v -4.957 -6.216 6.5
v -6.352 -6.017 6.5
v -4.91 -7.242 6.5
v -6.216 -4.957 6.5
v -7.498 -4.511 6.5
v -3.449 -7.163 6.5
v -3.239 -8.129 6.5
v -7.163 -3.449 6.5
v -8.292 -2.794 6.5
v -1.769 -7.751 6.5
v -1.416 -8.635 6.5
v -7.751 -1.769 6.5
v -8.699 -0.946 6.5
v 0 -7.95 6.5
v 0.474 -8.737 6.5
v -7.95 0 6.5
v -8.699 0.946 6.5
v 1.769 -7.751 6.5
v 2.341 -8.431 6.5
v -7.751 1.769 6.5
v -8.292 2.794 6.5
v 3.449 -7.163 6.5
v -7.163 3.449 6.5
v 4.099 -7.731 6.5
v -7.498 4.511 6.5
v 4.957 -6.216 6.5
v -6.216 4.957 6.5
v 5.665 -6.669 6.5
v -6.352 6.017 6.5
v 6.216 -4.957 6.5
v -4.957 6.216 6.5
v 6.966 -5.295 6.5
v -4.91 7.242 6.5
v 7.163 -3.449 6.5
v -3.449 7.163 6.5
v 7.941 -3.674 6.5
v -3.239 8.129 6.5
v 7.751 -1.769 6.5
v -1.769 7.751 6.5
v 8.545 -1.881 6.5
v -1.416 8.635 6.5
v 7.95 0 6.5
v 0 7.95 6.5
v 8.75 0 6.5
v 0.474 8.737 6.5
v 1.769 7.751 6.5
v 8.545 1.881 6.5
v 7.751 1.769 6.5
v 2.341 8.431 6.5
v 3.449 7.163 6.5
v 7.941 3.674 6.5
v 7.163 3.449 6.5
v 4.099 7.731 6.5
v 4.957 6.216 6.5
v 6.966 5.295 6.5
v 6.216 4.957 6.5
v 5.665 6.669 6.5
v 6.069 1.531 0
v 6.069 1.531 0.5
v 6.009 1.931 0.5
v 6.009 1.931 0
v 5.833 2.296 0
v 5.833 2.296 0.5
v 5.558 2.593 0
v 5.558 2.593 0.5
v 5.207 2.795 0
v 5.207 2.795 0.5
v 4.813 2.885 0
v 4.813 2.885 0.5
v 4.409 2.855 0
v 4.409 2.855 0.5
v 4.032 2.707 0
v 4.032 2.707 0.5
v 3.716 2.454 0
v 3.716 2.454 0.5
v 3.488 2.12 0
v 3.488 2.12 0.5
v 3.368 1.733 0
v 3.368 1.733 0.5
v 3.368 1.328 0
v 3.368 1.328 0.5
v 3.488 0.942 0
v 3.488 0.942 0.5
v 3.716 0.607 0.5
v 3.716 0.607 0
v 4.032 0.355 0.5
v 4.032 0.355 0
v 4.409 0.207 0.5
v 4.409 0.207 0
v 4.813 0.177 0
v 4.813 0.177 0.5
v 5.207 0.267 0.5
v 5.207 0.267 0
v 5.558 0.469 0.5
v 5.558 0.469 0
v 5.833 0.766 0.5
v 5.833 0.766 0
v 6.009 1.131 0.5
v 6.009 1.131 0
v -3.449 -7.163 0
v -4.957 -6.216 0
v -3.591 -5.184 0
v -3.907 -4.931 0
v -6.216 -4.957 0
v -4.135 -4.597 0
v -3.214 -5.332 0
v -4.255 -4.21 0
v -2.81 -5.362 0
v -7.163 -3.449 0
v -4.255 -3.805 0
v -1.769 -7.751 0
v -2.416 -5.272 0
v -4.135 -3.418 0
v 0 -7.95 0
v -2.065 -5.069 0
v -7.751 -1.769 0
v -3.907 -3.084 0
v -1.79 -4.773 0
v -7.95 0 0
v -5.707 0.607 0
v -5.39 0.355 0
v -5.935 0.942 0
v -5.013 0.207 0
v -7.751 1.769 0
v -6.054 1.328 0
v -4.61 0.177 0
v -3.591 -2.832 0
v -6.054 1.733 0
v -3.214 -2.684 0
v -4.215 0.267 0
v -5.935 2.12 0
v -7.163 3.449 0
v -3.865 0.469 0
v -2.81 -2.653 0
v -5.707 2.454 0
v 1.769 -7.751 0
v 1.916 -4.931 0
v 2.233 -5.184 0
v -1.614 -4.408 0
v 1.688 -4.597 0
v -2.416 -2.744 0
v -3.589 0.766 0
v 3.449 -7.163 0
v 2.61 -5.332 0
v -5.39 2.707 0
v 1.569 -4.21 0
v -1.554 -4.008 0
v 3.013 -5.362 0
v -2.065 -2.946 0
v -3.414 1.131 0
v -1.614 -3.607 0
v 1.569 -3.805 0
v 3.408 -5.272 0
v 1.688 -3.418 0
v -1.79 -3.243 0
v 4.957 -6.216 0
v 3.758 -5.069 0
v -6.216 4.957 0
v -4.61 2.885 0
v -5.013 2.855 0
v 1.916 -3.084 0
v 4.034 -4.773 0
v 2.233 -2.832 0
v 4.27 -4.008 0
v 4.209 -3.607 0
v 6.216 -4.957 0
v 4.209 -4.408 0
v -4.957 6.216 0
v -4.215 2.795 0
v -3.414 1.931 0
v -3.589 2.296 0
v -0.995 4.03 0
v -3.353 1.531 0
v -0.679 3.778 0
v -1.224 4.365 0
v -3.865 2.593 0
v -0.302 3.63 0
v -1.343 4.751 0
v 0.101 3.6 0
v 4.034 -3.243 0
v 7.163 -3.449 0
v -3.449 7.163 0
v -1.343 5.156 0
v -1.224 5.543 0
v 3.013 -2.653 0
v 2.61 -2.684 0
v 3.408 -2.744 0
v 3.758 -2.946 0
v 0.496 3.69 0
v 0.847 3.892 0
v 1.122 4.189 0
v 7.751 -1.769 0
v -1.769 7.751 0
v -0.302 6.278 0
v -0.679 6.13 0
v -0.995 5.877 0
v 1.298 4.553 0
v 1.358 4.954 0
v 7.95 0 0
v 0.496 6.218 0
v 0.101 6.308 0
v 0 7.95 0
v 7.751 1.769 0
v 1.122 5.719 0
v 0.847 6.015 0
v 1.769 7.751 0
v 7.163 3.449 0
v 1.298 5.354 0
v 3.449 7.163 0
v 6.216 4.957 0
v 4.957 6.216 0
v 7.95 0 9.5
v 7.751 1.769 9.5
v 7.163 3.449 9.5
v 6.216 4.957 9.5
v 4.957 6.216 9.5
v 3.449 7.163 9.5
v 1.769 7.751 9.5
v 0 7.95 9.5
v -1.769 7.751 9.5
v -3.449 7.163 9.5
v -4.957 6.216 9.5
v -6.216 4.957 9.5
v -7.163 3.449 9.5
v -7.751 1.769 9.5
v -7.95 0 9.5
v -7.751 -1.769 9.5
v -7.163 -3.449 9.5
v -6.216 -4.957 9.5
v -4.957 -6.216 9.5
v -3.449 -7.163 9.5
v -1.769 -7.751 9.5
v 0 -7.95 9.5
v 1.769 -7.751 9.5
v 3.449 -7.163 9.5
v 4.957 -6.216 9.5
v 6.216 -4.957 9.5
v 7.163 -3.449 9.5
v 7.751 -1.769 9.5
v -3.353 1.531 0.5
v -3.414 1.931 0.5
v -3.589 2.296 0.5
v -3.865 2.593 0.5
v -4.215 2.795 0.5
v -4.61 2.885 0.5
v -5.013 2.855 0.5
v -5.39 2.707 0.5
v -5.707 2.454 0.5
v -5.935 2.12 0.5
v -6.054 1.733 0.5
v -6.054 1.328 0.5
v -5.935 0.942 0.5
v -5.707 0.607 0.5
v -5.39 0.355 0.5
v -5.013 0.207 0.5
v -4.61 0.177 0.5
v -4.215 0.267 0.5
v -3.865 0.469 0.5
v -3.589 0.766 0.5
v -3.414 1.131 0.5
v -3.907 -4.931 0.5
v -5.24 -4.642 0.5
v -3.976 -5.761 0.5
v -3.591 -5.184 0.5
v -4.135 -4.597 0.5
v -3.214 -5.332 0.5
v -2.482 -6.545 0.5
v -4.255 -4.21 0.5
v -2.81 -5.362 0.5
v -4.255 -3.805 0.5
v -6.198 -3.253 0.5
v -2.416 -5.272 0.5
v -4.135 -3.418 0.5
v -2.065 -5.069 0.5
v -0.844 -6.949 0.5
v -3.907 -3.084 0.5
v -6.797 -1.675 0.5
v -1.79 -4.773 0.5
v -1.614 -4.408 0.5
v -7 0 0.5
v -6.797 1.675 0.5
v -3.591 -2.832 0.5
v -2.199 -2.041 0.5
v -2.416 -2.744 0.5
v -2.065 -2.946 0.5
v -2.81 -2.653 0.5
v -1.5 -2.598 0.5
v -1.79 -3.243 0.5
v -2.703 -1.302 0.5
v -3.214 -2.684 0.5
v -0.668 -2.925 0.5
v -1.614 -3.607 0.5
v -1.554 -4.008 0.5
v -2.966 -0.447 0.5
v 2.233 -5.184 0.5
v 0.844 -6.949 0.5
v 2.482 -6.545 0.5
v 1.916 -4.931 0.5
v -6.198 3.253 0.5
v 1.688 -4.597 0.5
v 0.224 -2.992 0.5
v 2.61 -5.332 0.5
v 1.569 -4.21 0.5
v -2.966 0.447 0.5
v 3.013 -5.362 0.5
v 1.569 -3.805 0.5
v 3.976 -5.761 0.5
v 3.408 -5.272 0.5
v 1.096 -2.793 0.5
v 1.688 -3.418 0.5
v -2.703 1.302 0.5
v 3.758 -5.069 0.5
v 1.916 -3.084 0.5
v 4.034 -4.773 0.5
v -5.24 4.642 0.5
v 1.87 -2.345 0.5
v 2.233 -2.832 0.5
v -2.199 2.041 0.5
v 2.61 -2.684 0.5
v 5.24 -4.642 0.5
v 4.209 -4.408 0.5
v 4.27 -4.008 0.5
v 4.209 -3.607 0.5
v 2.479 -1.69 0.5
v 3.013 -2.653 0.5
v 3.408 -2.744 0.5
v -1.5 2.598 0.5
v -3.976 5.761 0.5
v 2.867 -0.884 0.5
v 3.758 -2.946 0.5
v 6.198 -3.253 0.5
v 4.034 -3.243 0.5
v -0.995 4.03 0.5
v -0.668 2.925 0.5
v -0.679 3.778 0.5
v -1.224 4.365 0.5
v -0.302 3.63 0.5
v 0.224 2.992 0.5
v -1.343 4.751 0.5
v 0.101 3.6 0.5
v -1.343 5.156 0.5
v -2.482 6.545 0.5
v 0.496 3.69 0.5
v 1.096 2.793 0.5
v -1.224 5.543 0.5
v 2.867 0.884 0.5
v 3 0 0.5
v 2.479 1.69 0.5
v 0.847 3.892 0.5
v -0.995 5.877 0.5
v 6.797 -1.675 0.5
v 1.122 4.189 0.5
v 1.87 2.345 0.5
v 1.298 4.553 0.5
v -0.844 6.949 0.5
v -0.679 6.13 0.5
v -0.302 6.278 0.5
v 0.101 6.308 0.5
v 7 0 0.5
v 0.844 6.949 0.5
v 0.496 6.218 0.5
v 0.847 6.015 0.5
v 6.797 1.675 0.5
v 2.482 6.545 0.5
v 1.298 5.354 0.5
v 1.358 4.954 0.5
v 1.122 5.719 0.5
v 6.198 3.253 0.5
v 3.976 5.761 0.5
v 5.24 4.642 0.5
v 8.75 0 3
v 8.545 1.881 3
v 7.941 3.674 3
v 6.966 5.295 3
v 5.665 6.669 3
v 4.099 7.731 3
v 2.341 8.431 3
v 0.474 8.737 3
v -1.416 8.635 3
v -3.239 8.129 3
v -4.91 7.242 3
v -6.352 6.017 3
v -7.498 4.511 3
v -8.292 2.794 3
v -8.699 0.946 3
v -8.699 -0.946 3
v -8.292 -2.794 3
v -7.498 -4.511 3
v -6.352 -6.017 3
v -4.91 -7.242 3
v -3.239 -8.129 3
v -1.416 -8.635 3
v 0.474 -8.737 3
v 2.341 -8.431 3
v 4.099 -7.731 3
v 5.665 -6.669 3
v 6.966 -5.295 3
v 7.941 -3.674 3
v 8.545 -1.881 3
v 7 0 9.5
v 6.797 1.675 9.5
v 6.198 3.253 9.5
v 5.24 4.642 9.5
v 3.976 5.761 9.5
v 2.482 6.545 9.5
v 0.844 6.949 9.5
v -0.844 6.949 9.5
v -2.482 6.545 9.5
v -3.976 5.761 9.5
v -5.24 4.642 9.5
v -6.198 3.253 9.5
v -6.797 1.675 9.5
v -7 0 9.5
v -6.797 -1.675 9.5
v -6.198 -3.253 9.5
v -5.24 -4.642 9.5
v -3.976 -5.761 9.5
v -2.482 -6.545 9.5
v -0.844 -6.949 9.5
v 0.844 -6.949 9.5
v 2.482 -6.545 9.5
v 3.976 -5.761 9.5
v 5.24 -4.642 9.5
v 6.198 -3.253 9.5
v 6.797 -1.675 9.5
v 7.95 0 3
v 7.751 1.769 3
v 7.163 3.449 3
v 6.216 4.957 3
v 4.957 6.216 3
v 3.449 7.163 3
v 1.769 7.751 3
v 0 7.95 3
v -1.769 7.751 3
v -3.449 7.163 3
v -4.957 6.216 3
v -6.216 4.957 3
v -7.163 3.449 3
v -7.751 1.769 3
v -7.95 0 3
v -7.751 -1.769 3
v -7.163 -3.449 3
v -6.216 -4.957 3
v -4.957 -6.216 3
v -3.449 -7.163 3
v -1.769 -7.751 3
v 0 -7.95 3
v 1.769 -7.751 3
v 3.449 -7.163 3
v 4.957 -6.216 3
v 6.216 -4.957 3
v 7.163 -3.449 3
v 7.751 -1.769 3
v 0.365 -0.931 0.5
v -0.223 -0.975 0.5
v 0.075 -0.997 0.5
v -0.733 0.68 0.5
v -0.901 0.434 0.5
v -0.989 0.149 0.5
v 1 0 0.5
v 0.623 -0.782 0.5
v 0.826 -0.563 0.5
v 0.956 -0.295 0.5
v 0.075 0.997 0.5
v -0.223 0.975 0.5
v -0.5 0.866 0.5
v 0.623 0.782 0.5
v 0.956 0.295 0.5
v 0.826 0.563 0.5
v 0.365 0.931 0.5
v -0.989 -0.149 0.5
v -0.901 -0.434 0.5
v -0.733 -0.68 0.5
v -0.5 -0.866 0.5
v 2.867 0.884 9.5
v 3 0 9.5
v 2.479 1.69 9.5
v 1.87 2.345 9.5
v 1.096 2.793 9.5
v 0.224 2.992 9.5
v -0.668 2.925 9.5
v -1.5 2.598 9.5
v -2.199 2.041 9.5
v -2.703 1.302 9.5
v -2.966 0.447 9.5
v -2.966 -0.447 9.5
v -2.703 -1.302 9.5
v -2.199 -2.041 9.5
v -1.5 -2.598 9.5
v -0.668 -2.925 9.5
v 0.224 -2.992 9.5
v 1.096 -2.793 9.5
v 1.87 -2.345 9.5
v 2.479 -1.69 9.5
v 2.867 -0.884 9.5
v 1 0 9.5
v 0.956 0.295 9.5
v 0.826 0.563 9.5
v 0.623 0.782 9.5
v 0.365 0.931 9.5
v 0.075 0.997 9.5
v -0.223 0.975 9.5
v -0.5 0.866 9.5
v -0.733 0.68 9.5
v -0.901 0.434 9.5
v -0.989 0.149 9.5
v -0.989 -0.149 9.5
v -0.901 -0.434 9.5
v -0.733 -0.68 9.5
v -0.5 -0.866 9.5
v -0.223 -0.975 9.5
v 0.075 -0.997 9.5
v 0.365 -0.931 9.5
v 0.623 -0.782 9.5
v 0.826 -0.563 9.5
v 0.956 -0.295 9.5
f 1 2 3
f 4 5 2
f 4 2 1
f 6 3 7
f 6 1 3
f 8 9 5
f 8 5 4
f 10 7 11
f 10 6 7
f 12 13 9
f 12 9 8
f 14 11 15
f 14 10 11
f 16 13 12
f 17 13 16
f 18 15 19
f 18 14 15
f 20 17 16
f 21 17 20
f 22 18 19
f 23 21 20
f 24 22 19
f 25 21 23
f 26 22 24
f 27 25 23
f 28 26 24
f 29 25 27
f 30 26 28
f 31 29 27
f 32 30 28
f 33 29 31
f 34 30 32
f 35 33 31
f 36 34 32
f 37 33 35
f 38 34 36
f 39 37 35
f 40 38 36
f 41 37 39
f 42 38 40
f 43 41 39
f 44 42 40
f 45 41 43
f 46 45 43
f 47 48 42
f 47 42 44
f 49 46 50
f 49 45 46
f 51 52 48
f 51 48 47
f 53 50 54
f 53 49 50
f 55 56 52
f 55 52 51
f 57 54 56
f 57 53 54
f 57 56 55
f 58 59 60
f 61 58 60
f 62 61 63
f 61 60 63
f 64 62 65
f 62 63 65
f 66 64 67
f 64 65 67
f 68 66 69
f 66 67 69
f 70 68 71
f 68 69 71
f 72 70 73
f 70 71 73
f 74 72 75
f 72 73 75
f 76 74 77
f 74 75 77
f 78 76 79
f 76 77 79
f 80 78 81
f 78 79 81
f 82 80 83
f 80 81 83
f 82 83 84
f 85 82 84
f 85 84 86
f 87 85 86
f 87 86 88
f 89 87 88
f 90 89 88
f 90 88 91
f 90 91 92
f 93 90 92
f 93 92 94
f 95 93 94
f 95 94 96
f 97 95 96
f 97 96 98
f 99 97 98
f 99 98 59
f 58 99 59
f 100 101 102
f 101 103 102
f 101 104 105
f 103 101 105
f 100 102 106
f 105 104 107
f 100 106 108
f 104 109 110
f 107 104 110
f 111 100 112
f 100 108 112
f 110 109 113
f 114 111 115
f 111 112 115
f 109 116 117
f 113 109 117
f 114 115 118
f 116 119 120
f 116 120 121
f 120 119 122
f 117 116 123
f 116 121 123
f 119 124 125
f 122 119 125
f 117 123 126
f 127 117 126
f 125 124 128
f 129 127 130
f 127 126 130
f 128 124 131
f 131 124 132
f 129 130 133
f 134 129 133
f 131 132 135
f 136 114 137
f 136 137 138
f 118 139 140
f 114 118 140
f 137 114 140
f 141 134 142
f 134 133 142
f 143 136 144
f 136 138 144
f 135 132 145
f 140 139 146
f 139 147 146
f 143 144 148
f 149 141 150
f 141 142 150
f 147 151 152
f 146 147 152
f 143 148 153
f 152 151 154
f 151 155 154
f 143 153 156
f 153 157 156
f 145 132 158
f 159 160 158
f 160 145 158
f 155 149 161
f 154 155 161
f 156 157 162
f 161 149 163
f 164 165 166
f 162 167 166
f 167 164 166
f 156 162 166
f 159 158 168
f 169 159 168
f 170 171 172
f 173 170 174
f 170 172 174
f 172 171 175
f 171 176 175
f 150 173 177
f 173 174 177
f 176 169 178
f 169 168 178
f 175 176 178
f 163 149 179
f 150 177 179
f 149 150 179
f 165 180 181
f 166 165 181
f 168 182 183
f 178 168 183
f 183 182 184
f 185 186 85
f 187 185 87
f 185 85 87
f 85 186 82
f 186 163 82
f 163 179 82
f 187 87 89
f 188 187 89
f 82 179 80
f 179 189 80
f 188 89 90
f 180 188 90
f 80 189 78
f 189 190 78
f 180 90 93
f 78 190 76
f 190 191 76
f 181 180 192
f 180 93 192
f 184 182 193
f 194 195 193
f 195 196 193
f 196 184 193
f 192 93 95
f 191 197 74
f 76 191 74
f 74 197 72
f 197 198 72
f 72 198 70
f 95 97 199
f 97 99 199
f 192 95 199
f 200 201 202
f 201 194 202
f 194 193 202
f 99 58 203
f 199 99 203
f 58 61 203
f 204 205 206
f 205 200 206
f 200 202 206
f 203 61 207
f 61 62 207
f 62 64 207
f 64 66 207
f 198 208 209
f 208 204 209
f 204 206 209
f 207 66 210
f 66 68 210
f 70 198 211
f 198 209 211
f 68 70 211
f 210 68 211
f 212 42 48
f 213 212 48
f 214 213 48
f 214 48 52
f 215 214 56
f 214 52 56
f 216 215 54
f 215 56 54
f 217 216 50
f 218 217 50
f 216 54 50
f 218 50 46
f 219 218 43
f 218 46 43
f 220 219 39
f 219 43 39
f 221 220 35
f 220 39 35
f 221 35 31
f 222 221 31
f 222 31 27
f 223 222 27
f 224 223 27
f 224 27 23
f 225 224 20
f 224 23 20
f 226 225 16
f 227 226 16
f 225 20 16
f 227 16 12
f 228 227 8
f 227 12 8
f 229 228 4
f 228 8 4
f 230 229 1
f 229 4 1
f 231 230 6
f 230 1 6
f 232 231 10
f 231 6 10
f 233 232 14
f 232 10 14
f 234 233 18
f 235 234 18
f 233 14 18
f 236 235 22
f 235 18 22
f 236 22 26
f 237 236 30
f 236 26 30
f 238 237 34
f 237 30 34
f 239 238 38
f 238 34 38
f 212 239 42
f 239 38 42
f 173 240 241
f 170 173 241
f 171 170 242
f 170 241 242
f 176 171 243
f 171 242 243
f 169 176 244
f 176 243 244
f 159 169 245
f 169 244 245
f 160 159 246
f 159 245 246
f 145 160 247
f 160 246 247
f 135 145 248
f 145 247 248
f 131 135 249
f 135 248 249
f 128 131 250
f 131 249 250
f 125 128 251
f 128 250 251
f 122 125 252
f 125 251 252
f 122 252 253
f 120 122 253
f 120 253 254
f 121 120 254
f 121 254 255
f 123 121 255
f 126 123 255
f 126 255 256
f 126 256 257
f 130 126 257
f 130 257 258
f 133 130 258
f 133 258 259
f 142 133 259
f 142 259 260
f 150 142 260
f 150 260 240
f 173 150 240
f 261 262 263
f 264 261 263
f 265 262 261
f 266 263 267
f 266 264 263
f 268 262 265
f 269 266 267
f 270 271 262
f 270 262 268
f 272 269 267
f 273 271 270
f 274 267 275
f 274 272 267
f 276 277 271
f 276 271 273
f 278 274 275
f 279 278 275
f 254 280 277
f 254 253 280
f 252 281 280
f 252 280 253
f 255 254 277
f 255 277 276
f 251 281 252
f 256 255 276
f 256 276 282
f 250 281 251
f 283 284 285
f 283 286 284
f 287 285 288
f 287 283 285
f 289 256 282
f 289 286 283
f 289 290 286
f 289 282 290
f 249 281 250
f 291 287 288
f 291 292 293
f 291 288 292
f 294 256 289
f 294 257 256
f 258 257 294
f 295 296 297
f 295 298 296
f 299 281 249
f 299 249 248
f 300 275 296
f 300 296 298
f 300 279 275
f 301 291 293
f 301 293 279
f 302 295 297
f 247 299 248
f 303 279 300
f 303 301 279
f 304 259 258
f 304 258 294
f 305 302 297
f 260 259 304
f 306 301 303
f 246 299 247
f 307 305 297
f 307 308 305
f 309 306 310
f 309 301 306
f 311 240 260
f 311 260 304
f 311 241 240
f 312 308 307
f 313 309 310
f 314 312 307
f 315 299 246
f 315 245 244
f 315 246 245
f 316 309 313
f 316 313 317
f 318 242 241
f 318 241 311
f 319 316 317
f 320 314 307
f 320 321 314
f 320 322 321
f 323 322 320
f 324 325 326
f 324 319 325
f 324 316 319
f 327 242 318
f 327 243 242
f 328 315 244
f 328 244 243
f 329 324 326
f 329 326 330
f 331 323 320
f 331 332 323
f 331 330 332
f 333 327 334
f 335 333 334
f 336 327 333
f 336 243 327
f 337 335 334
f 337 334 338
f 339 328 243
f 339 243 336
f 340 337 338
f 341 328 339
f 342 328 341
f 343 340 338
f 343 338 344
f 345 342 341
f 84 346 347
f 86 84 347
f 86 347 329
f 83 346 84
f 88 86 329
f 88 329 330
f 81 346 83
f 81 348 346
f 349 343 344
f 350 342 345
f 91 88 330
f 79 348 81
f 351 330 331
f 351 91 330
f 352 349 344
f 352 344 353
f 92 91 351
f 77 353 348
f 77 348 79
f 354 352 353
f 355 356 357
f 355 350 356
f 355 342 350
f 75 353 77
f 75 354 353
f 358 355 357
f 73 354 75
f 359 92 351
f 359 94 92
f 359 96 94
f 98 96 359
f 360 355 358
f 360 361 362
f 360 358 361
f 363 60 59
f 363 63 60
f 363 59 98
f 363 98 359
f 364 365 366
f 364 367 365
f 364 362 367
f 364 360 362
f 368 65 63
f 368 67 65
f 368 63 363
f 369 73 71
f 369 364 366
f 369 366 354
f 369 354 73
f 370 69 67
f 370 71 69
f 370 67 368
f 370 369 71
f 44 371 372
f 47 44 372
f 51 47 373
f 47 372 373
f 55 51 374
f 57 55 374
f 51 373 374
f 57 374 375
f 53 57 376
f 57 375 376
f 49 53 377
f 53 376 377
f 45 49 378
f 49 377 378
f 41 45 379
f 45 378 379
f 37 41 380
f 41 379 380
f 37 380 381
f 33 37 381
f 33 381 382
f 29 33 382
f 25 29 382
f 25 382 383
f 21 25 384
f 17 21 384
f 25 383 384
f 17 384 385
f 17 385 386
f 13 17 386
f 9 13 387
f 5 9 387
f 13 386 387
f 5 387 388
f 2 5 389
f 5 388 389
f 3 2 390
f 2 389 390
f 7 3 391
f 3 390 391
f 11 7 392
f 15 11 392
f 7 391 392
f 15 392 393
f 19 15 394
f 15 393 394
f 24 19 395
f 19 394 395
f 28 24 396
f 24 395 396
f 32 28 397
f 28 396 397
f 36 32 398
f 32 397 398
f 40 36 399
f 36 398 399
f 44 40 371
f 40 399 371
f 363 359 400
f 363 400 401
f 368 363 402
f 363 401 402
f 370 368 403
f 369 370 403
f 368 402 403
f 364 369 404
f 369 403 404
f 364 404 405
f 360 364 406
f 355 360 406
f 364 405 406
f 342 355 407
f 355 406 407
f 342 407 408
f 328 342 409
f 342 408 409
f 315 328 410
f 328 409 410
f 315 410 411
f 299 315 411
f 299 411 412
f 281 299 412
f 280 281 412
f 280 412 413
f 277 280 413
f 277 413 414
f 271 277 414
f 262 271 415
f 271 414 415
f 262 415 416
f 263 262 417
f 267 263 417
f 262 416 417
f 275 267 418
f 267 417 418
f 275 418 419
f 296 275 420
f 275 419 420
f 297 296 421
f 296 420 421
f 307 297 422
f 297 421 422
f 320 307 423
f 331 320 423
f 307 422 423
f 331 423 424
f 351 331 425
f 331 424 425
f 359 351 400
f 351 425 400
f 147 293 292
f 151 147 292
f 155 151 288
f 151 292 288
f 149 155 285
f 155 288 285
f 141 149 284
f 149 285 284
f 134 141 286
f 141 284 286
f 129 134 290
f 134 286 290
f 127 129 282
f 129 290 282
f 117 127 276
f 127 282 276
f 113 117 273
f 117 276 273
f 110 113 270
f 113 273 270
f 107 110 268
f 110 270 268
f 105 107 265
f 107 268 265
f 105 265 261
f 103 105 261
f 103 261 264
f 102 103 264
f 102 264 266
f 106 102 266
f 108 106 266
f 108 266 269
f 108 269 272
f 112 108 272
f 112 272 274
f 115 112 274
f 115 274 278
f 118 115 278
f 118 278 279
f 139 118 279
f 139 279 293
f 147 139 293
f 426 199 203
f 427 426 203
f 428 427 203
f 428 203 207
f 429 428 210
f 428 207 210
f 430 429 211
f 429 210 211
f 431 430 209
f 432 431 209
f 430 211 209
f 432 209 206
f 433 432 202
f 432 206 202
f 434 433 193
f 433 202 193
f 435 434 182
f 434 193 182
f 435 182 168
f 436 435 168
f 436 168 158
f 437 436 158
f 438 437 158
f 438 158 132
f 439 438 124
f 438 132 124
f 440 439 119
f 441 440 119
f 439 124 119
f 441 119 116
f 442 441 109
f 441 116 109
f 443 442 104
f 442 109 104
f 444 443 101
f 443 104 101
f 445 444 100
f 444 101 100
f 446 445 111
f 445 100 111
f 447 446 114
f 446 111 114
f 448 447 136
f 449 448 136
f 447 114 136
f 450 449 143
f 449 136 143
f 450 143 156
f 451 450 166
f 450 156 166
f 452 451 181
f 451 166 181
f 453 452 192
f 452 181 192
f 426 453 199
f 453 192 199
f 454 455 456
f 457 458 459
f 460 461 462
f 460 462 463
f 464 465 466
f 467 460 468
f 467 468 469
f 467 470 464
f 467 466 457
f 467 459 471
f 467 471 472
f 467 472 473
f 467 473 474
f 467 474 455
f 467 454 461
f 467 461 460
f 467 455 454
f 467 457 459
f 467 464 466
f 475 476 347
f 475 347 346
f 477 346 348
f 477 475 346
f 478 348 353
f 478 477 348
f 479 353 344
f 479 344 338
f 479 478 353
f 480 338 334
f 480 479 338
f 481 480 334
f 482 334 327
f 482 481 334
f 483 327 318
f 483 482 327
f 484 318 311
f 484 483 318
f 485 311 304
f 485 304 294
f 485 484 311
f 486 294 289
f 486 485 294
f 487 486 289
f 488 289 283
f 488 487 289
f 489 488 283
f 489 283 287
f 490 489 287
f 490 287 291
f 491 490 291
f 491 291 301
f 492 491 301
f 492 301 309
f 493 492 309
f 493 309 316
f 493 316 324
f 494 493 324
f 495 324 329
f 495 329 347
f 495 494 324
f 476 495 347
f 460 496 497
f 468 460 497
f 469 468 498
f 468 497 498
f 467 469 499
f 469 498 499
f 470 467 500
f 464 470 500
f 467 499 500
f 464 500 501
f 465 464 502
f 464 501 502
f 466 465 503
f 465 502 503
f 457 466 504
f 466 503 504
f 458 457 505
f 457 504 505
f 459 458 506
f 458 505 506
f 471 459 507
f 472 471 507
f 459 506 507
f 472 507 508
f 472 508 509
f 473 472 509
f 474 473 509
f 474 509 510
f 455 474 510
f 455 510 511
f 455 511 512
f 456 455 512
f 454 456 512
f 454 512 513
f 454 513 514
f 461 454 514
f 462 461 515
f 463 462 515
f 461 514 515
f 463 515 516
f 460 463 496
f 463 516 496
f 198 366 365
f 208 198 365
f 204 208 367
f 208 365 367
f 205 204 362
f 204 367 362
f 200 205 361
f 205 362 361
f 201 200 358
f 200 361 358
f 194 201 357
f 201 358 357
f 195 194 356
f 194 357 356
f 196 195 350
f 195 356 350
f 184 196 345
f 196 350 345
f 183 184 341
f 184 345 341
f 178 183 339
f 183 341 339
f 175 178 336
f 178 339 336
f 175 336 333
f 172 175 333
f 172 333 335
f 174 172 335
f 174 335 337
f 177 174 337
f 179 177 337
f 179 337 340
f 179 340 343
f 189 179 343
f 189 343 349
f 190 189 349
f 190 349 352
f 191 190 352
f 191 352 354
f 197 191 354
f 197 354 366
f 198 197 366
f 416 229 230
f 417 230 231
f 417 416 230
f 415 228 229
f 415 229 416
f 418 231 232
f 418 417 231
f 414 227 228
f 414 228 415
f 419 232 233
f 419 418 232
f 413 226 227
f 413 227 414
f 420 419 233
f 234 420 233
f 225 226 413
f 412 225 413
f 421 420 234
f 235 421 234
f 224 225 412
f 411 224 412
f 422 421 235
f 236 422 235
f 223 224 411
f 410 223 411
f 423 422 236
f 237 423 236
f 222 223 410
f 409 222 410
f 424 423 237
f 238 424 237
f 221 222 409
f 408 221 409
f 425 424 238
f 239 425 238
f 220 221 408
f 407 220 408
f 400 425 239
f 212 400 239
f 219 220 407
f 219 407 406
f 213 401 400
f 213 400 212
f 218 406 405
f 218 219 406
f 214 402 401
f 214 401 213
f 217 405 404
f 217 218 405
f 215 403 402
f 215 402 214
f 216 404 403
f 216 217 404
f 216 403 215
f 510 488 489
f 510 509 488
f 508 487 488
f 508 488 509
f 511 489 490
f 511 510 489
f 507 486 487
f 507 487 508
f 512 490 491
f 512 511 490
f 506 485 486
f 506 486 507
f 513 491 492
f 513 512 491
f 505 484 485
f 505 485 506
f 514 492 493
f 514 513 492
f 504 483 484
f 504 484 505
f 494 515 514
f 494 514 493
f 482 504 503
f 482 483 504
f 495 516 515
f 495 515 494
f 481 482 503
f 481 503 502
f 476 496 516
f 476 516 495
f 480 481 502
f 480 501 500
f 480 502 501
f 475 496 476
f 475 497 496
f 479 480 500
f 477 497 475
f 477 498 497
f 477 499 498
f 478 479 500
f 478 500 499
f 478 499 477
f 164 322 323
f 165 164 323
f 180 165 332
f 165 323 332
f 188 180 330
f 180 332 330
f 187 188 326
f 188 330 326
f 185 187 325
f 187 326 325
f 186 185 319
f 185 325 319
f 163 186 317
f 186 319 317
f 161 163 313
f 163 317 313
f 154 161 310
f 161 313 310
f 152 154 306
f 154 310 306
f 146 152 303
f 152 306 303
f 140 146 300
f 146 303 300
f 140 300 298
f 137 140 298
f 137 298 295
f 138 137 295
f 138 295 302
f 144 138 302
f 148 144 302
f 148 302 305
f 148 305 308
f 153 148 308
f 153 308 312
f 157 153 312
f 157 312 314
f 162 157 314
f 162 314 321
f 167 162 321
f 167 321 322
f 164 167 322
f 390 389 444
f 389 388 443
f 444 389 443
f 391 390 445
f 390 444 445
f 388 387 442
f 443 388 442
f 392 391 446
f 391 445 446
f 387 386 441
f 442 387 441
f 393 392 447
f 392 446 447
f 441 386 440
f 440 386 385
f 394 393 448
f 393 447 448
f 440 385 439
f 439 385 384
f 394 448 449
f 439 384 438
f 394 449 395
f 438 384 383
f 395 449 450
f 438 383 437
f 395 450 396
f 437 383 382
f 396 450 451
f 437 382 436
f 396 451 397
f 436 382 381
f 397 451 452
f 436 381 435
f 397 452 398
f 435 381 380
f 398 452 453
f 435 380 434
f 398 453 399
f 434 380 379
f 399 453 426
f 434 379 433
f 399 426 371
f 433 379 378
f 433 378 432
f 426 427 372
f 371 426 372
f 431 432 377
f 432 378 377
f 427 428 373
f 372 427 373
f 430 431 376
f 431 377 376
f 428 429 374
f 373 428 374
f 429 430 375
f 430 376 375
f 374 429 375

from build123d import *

# Parameters (mm, degrees)
F0_R      = 7.95
F1_DEPTH  = 3
F2_R      = 8.75
F3_DEPTH  = 3.5
F4_R      = 7.95
F5_DEPTH  = 3
F6_R      = 1.3579973099
F9_DEPTH  = 20.4
F8_R      = 7
F8_R_2    = 3
F8_R_3    = 1
F10_DEPTH = 9


with BuildPart() as f1:
    # F0 (on Top) → F1 (new body)
    with BuildSketch(Plane.XY):
        Circle(F0_R)
    extrude(amount=F1_DEPTH)

    # F2 (on face) → F3 (join)
    with BuildSketch(Plane.XY.offset(3)):
        Circle(F2_R)
    extrude(amount=F3_DEPTH)

    # F4 (on face) → F5 (join)
    with BuildSketch(Plane.XY.offset(6.5)):
        Circle(F4_R)
    extrude(amount=F5_DEPTH)

    # F6 (on face) → F9 (cut)
    with BuildSketch(Plane.XY.offset(9.5)):
        with Locations((0, 4.9537713639)):
            Circle(F6_R)
        with Locations((-4.7113165359, 1.5307995377)):
            Circle(F6_R)
        with Locations((-2.911753751, -4.0076852197)):
            Circle(F6_R)
        with Locations((2.911753751, -4.0076852197)):
            Circle(F6_R)
        with Locations((4.7113165359, 1.5307995377)):
            Circle(F6_R)
    extrude(amount=-F9_DEPTH, mode=Mode.SUBTRACT)

    # F8 (on face) → F10 (cut)
    with BuildSketch(Plane.XY.offset(9.5)):
        Circle(F8_R)
        Circle(F8_R_2, mode=Mode.SUBTRACT)
        Circle(F8_R_3)
    extrude(amount=-F10_DEPTH, mode=Mode.SUBTRACT)


solid = f1.part
